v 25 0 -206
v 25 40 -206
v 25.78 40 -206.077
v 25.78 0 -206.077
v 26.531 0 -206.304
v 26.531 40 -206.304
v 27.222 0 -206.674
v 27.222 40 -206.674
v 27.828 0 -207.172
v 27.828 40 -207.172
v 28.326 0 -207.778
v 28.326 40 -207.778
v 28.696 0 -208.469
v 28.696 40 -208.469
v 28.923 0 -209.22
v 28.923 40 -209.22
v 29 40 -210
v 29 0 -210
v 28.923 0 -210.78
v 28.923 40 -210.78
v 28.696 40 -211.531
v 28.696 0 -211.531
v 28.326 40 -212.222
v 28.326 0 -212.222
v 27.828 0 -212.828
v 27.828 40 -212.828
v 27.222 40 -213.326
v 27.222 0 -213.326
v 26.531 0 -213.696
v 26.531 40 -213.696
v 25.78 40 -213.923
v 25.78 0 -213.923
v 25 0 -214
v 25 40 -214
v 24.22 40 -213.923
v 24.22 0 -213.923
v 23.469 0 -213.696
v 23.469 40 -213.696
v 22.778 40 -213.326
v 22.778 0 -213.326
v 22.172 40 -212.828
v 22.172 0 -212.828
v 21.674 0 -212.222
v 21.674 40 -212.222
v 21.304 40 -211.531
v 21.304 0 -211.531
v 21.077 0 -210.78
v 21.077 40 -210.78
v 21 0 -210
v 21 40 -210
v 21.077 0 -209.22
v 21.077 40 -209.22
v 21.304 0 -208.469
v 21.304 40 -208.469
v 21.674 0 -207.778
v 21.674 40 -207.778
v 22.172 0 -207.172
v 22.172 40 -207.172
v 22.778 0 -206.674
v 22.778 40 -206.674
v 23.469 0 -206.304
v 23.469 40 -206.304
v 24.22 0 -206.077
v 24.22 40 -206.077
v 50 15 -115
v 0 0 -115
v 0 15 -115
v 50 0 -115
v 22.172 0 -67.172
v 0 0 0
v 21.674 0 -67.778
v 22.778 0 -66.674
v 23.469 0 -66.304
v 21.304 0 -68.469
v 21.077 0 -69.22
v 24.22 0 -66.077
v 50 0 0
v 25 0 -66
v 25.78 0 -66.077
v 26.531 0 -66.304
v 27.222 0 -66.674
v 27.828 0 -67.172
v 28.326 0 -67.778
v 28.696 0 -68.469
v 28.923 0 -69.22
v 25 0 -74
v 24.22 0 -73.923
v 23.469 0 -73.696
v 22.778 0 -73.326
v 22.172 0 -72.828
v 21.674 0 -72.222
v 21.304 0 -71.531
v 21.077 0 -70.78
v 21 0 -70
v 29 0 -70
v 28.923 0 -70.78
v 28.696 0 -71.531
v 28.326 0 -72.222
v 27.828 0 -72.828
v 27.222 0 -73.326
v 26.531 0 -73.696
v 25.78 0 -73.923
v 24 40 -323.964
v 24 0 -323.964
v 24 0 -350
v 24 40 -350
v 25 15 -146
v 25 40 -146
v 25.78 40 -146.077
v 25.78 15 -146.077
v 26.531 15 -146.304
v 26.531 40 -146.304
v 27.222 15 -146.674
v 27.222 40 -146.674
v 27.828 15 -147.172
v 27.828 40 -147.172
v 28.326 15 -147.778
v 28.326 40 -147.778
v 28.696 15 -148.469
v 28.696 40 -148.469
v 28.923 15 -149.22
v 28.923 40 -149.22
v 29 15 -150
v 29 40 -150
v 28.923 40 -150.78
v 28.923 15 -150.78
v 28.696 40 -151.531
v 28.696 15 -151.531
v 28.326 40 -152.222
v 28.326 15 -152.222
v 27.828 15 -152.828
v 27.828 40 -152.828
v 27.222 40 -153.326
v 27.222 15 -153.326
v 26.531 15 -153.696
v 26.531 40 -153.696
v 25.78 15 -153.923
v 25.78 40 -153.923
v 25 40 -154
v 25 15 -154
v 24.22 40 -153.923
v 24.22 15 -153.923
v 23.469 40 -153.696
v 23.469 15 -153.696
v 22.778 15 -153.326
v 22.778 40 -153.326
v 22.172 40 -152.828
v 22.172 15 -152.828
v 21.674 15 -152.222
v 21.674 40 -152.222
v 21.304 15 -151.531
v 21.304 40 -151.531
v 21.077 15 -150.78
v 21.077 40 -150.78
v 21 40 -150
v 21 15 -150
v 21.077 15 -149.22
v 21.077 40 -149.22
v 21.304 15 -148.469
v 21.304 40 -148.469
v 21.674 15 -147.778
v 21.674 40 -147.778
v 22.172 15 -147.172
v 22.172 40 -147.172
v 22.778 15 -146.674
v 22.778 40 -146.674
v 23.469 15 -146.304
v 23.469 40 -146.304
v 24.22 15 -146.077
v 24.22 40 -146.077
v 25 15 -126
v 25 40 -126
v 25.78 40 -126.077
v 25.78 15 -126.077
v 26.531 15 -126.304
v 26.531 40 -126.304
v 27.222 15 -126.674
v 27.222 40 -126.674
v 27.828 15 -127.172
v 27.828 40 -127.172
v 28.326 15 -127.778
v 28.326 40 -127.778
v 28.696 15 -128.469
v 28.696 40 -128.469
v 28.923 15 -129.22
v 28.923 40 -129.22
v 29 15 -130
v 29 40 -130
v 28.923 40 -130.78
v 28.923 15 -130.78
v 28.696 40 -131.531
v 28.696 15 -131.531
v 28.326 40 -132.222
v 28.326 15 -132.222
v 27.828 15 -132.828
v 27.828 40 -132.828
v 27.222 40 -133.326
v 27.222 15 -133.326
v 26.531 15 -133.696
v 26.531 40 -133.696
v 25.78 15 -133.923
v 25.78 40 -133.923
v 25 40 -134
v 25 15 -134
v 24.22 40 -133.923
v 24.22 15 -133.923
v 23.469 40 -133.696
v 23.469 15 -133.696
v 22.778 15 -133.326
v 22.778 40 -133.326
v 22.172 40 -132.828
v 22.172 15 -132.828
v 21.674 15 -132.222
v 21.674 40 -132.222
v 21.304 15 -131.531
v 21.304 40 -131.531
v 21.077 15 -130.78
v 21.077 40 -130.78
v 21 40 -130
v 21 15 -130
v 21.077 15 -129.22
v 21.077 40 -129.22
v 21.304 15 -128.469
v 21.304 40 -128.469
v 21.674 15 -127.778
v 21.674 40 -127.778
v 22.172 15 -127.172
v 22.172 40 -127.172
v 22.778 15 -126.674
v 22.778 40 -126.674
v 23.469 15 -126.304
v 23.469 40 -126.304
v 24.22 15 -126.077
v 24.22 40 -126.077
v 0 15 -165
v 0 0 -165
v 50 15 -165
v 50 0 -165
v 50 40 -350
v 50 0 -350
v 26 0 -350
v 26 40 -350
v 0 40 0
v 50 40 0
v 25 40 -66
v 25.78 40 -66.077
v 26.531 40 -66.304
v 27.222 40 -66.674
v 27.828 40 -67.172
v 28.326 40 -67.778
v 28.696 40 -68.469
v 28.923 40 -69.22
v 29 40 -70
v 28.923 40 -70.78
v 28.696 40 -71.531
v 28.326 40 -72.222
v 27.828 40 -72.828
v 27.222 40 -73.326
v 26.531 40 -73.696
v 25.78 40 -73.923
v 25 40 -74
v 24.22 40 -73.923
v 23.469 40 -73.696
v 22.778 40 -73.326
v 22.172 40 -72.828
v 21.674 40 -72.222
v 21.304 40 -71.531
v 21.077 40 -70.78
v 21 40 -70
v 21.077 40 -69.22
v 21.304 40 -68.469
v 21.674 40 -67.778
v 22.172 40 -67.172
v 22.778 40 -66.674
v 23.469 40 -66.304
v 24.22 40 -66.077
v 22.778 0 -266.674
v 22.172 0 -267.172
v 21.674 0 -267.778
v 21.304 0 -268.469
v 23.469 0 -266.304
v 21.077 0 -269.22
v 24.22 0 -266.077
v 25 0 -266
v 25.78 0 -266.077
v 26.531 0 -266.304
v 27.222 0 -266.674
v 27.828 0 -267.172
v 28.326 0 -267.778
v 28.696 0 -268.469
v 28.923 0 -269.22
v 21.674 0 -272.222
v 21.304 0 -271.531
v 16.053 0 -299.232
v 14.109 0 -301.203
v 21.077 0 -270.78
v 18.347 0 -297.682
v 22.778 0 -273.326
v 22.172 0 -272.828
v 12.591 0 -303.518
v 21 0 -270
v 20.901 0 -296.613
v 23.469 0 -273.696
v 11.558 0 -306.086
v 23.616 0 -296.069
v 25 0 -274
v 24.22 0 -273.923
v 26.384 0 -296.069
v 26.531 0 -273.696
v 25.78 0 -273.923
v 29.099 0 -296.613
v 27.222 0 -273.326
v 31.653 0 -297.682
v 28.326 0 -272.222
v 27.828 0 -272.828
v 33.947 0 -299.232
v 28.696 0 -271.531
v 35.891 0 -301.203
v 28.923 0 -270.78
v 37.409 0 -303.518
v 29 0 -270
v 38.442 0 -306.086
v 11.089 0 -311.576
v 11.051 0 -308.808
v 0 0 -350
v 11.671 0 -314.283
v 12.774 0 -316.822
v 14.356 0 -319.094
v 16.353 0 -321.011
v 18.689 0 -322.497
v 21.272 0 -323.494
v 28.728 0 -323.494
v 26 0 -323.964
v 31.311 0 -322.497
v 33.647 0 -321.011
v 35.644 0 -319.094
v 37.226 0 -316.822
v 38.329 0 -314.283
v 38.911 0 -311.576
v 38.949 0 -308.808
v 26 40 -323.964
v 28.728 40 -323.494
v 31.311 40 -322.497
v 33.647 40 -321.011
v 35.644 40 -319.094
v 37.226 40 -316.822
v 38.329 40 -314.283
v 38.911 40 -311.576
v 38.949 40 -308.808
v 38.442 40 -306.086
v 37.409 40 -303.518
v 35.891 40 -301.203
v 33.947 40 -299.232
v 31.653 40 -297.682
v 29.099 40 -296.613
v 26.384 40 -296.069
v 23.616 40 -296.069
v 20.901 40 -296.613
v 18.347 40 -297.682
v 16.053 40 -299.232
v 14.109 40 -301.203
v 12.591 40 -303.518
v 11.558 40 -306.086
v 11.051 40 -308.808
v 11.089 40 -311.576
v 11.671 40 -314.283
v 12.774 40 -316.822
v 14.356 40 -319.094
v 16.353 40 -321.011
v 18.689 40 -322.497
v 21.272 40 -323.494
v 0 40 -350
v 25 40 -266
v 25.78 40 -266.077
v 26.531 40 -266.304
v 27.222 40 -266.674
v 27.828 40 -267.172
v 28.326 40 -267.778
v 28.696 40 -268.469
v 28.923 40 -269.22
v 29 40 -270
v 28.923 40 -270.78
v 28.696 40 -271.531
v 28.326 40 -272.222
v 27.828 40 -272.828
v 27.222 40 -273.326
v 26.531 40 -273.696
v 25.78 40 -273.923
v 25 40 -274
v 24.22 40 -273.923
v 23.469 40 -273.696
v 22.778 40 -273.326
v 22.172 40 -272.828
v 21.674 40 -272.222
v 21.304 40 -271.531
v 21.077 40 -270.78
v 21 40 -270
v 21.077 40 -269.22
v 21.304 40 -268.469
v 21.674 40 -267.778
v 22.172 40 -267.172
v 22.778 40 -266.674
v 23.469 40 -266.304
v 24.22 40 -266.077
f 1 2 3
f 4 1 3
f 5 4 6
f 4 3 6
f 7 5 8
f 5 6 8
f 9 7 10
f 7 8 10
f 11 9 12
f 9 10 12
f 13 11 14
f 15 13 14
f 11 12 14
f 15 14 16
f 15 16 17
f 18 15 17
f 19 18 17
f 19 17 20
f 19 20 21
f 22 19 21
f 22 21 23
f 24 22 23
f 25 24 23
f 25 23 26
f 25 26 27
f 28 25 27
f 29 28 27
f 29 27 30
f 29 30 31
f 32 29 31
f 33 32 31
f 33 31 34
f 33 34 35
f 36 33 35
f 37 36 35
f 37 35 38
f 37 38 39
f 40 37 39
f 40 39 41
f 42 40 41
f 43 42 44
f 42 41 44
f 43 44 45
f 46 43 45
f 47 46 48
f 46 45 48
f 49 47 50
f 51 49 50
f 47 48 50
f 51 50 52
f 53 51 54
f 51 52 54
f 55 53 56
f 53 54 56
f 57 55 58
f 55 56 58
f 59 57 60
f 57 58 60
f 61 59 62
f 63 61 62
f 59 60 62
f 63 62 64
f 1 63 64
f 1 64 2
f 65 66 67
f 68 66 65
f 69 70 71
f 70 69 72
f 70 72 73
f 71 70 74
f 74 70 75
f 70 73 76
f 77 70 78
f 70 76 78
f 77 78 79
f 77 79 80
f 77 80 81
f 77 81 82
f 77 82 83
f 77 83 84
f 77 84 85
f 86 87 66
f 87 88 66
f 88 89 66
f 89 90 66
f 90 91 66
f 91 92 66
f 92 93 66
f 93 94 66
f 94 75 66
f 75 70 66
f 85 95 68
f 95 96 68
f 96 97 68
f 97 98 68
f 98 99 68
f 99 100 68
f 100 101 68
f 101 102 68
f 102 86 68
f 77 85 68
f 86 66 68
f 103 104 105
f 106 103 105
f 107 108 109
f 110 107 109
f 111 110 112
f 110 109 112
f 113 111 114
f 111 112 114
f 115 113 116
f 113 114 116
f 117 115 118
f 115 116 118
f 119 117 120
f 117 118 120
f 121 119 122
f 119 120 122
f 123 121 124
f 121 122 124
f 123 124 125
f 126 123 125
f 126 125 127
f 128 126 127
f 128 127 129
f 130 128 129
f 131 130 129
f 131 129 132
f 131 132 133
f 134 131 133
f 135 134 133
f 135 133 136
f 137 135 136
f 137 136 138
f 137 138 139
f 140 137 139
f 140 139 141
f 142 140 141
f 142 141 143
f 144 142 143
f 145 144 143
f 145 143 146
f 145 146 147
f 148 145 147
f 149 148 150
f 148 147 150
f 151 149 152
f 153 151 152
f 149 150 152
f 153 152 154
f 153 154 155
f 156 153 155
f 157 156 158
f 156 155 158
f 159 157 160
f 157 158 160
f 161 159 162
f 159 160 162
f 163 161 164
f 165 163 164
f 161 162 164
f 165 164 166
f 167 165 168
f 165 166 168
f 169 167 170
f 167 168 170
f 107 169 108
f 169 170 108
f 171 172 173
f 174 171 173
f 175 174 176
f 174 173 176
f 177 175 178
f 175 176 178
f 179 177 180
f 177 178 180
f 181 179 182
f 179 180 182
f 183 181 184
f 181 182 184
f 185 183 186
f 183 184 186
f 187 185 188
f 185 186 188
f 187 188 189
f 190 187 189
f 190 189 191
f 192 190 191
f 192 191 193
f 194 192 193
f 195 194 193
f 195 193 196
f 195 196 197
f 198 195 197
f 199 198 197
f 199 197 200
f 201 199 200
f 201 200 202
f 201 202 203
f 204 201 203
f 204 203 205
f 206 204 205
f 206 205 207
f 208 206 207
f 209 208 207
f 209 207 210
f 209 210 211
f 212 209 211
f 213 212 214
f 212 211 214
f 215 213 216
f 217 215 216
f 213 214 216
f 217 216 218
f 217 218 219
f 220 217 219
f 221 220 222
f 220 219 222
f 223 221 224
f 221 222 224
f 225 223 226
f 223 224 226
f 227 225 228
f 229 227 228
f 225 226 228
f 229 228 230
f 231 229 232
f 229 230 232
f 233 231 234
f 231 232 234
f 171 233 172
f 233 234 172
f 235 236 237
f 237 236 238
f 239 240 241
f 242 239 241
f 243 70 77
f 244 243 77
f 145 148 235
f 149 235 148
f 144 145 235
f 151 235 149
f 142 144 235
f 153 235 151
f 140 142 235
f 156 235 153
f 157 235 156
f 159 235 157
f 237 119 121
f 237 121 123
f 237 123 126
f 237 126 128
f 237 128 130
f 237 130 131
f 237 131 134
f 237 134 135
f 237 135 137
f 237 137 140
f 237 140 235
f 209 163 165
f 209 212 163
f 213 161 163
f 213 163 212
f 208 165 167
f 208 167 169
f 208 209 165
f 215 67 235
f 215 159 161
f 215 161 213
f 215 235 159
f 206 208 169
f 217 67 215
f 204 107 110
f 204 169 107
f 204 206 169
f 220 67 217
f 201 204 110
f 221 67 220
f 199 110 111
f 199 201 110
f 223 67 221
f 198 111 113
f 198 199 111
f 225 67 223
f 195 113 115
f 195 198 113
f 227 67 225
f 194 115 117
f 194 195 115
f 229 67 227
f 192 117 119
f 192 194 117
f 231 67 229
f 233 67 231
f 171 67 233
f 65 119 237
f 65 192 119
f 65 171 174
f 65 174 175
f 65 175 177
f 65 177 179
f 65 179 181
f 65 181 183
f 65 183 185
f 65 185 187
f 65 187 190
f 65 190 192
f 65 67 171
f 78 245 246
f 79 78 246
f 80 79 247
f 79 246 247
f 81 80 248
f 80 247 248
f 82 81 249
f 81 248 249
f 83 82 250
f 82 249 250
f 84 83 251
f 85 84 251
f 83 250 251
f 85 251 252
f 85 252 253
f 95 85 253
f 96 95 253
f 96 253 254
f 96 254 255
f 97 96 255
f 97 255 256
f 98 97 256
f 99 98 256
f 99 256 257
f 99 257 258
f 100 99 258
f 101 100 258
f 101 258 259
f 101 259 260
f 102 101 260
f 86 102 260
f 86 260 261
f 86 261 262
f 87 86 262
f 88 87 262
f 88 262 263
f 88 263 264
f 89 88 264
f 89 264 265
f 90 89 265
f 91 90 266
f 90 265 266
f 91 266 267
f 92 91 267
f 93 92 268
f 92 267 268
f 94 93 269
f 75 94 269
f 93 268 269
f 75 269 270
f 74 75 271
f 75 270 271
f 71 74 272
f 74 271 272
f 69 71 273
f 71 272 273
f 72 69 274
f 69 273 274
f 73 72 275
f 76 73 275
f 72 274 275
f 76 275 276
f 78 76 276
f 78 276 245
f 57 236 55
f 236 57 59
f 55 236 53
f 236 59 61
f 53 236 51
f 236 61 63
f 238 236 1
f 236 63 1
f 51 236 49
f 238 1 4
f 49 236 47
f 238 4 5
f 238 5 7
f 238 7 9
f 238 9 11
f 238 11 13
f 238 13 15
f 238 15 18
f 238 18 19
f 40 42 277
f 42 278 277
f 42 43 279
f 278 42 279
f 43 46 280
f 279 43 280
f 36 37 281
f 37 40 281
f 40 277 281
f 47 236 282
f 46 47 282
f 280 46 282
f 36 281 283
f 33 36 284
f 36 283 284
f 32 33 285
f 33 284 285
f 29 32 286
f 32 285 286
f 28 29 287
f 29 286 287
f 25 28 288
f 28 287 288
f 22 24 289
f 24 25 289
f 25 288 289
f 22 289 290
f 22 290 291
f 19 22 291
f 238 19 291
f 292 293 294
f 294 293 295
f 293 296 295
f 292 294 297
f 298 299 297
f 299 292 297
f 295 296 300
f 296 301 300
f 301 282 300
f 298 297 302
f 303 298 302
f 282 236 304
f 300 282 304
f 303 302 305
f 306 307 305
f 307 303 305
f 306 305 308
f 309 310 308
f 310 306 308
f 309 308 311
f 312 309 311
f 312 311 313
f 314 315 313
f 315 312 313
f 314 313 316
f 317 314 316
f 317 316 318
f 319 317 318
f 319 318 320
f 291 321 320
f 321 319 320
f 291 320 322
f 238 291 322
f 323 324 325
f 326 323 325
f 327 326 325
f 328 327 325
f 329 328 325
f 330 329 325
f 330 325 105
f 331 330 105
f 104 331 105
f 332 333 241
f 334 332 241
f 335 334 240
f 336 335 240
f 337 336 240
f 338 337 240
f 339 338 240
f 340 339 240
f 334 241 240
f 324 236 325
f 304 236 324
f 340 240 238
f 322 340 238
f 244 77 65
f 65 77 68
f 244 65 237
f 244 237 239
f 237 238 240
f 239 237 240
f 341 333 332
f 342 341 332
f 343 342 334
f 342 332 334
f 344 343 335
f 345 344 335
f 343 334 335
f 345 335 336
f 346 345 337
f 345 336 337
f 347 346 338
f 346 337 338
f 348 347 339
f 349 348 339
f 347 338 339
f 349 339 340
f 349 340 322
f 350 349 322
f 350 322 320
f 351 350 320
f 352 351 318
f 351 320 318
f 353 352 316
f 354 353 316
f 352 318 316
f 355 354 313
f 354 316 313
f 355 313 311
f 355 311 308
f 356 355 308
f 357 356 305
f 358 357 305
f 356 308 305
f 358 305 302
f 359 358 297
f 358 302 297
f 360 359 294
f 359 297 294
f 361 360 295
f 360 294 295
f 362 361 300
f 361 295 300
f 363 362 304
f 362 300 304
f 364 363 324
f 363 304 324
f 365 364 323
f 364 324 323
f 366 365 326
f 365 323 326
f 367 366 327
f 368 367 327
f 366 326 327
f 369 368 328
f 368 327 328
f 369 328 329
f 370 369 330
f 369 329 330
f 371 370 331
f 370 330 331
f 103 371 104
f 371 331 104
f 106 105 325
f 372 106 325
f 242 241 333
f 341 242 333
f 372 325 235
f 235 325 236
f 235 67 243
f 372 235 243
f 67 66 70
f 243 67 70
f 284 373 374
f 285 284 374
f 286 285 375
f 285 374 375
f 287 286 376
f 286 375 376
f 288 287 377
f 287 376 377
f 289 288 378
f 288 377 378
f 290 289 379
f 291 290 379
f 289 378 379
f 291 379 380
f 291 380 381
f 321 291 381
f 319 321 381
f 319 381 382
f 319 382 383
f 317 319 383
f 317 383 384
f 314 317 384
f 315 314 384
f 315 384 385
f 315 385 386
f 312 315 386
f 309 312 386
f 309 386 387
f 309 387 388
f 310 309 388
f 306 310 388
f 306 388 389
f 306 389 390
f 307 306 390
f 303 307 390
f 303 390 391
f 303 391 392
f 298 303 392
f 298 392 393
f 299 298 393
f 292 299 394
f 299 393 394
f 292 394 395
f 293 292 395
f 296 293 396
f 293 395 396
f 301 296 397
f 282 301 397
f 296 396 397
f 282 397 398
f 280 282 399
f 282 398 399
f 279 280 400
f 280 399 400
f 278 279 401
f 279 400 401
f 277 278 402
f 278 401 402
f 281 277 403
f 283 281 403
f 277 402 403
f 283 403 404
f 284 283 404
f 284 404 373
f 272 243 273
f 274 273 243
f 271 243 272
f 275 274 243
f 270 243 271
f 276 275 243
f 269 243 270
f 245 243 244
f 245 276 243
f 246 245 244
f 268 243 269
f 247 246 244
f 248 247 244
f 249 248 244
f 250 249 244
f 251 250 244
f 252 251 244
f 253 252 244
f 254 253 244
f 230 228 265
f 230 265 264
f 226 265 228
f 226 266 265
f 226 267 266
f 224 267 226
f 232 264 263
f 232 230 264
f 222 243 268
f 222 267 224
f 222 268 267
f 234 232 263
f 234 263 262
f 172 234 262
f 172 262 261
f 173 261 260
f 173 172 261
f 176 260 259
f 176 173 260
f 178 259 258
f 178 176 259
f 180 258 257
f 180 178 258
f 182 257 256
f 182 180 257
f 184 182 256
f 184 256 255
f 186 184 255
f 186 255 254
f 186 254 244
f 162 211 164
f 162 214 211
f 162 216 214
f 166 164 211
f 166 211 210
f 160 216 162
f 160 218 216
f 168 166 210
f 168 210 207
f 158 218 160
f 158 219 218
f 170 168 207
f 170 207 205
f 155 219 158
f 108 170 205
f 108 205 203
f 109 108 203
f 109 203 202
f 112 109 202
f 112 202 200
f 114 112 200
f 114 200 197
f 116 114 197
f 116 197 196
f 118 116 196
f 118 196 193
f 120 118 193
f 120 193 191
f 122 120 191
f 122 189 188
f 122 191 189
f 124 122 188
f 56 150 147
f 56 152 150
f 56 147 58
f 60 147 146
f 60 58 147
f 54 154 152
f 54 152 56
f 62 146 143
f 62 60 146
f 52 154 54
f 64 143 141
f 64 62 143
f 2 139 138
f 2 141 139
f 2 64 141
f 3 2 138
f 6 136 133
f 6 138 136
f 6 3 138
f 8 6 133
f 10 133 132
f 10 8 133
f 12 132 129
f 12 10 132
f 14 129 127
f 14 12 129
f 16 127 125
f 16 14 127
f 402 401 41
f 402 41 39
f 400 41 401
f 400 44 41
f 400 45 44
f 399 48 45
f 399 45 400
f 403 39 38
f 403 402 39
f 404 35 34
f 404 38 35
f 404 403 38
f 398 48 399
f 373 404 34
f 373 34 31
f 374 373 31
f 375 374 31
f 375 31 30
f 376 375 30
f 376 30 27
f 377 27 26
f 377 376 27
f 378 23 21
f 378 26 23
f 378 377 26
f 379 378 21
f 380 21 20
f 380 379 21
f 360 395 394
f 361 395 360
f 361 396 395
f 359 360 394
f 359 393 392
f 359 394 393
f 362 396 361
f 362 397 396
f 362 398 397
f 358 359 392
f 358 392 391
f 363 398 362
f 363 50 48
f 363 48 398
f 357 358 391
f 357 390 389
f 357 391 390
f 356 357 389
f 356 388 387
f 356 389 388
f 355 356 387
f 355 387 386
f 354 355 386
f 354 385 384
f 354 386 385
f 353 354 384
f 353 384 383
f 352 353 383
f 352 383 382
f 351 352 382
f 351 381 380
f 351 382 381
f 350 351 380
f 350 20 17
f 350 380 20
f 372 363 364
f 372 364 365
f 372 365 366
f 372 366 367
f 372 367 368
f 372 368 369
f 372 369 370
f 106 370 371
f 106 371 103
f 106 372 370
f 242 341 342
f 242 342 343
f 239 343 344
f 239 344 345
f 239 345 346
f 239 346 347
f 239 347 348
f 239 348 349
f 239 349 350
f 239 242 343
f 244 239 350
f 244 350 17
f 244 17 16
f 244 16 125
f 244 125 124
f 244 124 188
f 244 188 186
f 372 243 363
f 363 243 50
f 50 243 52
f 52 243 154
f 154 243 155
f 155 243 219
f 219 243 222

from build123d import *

# Parameters (mm, degrees)
EXTRUDE_1_DEPTH     = 40
SKETCH_2_R          = 4
CUT_EXTRUDE_1_DEPTH = 50
SKETCH_3_W          = 50
SKETCH_3_H          = 50
CUT_EXTRUDE_2_DEPTH = 15


with BuildPart() as part:
    # Эскиз1 → Бобышка-Вытянуть1 (new body)
    with BuildSketch(Plane(origin=(0, 0, 0), x_dir=(1, 0, 0), z_dir=(0, 1, 0))):
        with BuildLine():
            Line((0, 0), (50, 0))
            Line((50, 0), (50, 350))
            Line((50, 350), (26, 350))
            Line((26, 350), (26, 323.964240044))
            ThreePointArc((26, 323.964240044), (25, 296), (24, 323.964240044))
            Line((24, 323.964240044), (24, 350))
            Line((24, 350), (0, 350))
            Line((0, 350), (0, 0))
        make_face()
    extrude(amount=EXTRUDE_1_DEPTH)

    # Эскиз2 → Вырез-Вытянуть1 (cut)
    with BuildSketch(Plane(origin=(0, 40, 0), x_dir=(1, 0, 0), z_dir=(0, 1, 0))):
        with Locations(Location((25, 130, 0), (0, 0, 270))):
            Circle(SKETCH_2_R)
        with Locations(Location((25, 150, 0), (0, 0, 270))):
            Circle(SKETCH_2_R)
        with Locations(Location((25, 270, 0), (0, 0, 270))):
            Circle(SKETCH_2_R)
        with Locations(Location((25, 210, 0), (0, 0, 270))):
            Circle(SKETCH_2_R)
        with Locations(Location((25, 70, 0), (0, 0, 270))):
            Circle(SKETCH_2_R)
    extrude(amount=-CUT_EXTRUDE_1_DEPTH, mode=Mode.SUBTRACT)

    # Эскиз3 → Вырез-Вытянуть2 (cut)
    with BuildSketch(Plane.XZ):
        with Locations((25, -140)):
            Rectangle(SKETCH_3_W, SKETCH_3_H)
    extrude(amount=-CUT_EXTRUDE_2_DEPTH, mode=Mode.SUBTRACT)


solid = part.part
